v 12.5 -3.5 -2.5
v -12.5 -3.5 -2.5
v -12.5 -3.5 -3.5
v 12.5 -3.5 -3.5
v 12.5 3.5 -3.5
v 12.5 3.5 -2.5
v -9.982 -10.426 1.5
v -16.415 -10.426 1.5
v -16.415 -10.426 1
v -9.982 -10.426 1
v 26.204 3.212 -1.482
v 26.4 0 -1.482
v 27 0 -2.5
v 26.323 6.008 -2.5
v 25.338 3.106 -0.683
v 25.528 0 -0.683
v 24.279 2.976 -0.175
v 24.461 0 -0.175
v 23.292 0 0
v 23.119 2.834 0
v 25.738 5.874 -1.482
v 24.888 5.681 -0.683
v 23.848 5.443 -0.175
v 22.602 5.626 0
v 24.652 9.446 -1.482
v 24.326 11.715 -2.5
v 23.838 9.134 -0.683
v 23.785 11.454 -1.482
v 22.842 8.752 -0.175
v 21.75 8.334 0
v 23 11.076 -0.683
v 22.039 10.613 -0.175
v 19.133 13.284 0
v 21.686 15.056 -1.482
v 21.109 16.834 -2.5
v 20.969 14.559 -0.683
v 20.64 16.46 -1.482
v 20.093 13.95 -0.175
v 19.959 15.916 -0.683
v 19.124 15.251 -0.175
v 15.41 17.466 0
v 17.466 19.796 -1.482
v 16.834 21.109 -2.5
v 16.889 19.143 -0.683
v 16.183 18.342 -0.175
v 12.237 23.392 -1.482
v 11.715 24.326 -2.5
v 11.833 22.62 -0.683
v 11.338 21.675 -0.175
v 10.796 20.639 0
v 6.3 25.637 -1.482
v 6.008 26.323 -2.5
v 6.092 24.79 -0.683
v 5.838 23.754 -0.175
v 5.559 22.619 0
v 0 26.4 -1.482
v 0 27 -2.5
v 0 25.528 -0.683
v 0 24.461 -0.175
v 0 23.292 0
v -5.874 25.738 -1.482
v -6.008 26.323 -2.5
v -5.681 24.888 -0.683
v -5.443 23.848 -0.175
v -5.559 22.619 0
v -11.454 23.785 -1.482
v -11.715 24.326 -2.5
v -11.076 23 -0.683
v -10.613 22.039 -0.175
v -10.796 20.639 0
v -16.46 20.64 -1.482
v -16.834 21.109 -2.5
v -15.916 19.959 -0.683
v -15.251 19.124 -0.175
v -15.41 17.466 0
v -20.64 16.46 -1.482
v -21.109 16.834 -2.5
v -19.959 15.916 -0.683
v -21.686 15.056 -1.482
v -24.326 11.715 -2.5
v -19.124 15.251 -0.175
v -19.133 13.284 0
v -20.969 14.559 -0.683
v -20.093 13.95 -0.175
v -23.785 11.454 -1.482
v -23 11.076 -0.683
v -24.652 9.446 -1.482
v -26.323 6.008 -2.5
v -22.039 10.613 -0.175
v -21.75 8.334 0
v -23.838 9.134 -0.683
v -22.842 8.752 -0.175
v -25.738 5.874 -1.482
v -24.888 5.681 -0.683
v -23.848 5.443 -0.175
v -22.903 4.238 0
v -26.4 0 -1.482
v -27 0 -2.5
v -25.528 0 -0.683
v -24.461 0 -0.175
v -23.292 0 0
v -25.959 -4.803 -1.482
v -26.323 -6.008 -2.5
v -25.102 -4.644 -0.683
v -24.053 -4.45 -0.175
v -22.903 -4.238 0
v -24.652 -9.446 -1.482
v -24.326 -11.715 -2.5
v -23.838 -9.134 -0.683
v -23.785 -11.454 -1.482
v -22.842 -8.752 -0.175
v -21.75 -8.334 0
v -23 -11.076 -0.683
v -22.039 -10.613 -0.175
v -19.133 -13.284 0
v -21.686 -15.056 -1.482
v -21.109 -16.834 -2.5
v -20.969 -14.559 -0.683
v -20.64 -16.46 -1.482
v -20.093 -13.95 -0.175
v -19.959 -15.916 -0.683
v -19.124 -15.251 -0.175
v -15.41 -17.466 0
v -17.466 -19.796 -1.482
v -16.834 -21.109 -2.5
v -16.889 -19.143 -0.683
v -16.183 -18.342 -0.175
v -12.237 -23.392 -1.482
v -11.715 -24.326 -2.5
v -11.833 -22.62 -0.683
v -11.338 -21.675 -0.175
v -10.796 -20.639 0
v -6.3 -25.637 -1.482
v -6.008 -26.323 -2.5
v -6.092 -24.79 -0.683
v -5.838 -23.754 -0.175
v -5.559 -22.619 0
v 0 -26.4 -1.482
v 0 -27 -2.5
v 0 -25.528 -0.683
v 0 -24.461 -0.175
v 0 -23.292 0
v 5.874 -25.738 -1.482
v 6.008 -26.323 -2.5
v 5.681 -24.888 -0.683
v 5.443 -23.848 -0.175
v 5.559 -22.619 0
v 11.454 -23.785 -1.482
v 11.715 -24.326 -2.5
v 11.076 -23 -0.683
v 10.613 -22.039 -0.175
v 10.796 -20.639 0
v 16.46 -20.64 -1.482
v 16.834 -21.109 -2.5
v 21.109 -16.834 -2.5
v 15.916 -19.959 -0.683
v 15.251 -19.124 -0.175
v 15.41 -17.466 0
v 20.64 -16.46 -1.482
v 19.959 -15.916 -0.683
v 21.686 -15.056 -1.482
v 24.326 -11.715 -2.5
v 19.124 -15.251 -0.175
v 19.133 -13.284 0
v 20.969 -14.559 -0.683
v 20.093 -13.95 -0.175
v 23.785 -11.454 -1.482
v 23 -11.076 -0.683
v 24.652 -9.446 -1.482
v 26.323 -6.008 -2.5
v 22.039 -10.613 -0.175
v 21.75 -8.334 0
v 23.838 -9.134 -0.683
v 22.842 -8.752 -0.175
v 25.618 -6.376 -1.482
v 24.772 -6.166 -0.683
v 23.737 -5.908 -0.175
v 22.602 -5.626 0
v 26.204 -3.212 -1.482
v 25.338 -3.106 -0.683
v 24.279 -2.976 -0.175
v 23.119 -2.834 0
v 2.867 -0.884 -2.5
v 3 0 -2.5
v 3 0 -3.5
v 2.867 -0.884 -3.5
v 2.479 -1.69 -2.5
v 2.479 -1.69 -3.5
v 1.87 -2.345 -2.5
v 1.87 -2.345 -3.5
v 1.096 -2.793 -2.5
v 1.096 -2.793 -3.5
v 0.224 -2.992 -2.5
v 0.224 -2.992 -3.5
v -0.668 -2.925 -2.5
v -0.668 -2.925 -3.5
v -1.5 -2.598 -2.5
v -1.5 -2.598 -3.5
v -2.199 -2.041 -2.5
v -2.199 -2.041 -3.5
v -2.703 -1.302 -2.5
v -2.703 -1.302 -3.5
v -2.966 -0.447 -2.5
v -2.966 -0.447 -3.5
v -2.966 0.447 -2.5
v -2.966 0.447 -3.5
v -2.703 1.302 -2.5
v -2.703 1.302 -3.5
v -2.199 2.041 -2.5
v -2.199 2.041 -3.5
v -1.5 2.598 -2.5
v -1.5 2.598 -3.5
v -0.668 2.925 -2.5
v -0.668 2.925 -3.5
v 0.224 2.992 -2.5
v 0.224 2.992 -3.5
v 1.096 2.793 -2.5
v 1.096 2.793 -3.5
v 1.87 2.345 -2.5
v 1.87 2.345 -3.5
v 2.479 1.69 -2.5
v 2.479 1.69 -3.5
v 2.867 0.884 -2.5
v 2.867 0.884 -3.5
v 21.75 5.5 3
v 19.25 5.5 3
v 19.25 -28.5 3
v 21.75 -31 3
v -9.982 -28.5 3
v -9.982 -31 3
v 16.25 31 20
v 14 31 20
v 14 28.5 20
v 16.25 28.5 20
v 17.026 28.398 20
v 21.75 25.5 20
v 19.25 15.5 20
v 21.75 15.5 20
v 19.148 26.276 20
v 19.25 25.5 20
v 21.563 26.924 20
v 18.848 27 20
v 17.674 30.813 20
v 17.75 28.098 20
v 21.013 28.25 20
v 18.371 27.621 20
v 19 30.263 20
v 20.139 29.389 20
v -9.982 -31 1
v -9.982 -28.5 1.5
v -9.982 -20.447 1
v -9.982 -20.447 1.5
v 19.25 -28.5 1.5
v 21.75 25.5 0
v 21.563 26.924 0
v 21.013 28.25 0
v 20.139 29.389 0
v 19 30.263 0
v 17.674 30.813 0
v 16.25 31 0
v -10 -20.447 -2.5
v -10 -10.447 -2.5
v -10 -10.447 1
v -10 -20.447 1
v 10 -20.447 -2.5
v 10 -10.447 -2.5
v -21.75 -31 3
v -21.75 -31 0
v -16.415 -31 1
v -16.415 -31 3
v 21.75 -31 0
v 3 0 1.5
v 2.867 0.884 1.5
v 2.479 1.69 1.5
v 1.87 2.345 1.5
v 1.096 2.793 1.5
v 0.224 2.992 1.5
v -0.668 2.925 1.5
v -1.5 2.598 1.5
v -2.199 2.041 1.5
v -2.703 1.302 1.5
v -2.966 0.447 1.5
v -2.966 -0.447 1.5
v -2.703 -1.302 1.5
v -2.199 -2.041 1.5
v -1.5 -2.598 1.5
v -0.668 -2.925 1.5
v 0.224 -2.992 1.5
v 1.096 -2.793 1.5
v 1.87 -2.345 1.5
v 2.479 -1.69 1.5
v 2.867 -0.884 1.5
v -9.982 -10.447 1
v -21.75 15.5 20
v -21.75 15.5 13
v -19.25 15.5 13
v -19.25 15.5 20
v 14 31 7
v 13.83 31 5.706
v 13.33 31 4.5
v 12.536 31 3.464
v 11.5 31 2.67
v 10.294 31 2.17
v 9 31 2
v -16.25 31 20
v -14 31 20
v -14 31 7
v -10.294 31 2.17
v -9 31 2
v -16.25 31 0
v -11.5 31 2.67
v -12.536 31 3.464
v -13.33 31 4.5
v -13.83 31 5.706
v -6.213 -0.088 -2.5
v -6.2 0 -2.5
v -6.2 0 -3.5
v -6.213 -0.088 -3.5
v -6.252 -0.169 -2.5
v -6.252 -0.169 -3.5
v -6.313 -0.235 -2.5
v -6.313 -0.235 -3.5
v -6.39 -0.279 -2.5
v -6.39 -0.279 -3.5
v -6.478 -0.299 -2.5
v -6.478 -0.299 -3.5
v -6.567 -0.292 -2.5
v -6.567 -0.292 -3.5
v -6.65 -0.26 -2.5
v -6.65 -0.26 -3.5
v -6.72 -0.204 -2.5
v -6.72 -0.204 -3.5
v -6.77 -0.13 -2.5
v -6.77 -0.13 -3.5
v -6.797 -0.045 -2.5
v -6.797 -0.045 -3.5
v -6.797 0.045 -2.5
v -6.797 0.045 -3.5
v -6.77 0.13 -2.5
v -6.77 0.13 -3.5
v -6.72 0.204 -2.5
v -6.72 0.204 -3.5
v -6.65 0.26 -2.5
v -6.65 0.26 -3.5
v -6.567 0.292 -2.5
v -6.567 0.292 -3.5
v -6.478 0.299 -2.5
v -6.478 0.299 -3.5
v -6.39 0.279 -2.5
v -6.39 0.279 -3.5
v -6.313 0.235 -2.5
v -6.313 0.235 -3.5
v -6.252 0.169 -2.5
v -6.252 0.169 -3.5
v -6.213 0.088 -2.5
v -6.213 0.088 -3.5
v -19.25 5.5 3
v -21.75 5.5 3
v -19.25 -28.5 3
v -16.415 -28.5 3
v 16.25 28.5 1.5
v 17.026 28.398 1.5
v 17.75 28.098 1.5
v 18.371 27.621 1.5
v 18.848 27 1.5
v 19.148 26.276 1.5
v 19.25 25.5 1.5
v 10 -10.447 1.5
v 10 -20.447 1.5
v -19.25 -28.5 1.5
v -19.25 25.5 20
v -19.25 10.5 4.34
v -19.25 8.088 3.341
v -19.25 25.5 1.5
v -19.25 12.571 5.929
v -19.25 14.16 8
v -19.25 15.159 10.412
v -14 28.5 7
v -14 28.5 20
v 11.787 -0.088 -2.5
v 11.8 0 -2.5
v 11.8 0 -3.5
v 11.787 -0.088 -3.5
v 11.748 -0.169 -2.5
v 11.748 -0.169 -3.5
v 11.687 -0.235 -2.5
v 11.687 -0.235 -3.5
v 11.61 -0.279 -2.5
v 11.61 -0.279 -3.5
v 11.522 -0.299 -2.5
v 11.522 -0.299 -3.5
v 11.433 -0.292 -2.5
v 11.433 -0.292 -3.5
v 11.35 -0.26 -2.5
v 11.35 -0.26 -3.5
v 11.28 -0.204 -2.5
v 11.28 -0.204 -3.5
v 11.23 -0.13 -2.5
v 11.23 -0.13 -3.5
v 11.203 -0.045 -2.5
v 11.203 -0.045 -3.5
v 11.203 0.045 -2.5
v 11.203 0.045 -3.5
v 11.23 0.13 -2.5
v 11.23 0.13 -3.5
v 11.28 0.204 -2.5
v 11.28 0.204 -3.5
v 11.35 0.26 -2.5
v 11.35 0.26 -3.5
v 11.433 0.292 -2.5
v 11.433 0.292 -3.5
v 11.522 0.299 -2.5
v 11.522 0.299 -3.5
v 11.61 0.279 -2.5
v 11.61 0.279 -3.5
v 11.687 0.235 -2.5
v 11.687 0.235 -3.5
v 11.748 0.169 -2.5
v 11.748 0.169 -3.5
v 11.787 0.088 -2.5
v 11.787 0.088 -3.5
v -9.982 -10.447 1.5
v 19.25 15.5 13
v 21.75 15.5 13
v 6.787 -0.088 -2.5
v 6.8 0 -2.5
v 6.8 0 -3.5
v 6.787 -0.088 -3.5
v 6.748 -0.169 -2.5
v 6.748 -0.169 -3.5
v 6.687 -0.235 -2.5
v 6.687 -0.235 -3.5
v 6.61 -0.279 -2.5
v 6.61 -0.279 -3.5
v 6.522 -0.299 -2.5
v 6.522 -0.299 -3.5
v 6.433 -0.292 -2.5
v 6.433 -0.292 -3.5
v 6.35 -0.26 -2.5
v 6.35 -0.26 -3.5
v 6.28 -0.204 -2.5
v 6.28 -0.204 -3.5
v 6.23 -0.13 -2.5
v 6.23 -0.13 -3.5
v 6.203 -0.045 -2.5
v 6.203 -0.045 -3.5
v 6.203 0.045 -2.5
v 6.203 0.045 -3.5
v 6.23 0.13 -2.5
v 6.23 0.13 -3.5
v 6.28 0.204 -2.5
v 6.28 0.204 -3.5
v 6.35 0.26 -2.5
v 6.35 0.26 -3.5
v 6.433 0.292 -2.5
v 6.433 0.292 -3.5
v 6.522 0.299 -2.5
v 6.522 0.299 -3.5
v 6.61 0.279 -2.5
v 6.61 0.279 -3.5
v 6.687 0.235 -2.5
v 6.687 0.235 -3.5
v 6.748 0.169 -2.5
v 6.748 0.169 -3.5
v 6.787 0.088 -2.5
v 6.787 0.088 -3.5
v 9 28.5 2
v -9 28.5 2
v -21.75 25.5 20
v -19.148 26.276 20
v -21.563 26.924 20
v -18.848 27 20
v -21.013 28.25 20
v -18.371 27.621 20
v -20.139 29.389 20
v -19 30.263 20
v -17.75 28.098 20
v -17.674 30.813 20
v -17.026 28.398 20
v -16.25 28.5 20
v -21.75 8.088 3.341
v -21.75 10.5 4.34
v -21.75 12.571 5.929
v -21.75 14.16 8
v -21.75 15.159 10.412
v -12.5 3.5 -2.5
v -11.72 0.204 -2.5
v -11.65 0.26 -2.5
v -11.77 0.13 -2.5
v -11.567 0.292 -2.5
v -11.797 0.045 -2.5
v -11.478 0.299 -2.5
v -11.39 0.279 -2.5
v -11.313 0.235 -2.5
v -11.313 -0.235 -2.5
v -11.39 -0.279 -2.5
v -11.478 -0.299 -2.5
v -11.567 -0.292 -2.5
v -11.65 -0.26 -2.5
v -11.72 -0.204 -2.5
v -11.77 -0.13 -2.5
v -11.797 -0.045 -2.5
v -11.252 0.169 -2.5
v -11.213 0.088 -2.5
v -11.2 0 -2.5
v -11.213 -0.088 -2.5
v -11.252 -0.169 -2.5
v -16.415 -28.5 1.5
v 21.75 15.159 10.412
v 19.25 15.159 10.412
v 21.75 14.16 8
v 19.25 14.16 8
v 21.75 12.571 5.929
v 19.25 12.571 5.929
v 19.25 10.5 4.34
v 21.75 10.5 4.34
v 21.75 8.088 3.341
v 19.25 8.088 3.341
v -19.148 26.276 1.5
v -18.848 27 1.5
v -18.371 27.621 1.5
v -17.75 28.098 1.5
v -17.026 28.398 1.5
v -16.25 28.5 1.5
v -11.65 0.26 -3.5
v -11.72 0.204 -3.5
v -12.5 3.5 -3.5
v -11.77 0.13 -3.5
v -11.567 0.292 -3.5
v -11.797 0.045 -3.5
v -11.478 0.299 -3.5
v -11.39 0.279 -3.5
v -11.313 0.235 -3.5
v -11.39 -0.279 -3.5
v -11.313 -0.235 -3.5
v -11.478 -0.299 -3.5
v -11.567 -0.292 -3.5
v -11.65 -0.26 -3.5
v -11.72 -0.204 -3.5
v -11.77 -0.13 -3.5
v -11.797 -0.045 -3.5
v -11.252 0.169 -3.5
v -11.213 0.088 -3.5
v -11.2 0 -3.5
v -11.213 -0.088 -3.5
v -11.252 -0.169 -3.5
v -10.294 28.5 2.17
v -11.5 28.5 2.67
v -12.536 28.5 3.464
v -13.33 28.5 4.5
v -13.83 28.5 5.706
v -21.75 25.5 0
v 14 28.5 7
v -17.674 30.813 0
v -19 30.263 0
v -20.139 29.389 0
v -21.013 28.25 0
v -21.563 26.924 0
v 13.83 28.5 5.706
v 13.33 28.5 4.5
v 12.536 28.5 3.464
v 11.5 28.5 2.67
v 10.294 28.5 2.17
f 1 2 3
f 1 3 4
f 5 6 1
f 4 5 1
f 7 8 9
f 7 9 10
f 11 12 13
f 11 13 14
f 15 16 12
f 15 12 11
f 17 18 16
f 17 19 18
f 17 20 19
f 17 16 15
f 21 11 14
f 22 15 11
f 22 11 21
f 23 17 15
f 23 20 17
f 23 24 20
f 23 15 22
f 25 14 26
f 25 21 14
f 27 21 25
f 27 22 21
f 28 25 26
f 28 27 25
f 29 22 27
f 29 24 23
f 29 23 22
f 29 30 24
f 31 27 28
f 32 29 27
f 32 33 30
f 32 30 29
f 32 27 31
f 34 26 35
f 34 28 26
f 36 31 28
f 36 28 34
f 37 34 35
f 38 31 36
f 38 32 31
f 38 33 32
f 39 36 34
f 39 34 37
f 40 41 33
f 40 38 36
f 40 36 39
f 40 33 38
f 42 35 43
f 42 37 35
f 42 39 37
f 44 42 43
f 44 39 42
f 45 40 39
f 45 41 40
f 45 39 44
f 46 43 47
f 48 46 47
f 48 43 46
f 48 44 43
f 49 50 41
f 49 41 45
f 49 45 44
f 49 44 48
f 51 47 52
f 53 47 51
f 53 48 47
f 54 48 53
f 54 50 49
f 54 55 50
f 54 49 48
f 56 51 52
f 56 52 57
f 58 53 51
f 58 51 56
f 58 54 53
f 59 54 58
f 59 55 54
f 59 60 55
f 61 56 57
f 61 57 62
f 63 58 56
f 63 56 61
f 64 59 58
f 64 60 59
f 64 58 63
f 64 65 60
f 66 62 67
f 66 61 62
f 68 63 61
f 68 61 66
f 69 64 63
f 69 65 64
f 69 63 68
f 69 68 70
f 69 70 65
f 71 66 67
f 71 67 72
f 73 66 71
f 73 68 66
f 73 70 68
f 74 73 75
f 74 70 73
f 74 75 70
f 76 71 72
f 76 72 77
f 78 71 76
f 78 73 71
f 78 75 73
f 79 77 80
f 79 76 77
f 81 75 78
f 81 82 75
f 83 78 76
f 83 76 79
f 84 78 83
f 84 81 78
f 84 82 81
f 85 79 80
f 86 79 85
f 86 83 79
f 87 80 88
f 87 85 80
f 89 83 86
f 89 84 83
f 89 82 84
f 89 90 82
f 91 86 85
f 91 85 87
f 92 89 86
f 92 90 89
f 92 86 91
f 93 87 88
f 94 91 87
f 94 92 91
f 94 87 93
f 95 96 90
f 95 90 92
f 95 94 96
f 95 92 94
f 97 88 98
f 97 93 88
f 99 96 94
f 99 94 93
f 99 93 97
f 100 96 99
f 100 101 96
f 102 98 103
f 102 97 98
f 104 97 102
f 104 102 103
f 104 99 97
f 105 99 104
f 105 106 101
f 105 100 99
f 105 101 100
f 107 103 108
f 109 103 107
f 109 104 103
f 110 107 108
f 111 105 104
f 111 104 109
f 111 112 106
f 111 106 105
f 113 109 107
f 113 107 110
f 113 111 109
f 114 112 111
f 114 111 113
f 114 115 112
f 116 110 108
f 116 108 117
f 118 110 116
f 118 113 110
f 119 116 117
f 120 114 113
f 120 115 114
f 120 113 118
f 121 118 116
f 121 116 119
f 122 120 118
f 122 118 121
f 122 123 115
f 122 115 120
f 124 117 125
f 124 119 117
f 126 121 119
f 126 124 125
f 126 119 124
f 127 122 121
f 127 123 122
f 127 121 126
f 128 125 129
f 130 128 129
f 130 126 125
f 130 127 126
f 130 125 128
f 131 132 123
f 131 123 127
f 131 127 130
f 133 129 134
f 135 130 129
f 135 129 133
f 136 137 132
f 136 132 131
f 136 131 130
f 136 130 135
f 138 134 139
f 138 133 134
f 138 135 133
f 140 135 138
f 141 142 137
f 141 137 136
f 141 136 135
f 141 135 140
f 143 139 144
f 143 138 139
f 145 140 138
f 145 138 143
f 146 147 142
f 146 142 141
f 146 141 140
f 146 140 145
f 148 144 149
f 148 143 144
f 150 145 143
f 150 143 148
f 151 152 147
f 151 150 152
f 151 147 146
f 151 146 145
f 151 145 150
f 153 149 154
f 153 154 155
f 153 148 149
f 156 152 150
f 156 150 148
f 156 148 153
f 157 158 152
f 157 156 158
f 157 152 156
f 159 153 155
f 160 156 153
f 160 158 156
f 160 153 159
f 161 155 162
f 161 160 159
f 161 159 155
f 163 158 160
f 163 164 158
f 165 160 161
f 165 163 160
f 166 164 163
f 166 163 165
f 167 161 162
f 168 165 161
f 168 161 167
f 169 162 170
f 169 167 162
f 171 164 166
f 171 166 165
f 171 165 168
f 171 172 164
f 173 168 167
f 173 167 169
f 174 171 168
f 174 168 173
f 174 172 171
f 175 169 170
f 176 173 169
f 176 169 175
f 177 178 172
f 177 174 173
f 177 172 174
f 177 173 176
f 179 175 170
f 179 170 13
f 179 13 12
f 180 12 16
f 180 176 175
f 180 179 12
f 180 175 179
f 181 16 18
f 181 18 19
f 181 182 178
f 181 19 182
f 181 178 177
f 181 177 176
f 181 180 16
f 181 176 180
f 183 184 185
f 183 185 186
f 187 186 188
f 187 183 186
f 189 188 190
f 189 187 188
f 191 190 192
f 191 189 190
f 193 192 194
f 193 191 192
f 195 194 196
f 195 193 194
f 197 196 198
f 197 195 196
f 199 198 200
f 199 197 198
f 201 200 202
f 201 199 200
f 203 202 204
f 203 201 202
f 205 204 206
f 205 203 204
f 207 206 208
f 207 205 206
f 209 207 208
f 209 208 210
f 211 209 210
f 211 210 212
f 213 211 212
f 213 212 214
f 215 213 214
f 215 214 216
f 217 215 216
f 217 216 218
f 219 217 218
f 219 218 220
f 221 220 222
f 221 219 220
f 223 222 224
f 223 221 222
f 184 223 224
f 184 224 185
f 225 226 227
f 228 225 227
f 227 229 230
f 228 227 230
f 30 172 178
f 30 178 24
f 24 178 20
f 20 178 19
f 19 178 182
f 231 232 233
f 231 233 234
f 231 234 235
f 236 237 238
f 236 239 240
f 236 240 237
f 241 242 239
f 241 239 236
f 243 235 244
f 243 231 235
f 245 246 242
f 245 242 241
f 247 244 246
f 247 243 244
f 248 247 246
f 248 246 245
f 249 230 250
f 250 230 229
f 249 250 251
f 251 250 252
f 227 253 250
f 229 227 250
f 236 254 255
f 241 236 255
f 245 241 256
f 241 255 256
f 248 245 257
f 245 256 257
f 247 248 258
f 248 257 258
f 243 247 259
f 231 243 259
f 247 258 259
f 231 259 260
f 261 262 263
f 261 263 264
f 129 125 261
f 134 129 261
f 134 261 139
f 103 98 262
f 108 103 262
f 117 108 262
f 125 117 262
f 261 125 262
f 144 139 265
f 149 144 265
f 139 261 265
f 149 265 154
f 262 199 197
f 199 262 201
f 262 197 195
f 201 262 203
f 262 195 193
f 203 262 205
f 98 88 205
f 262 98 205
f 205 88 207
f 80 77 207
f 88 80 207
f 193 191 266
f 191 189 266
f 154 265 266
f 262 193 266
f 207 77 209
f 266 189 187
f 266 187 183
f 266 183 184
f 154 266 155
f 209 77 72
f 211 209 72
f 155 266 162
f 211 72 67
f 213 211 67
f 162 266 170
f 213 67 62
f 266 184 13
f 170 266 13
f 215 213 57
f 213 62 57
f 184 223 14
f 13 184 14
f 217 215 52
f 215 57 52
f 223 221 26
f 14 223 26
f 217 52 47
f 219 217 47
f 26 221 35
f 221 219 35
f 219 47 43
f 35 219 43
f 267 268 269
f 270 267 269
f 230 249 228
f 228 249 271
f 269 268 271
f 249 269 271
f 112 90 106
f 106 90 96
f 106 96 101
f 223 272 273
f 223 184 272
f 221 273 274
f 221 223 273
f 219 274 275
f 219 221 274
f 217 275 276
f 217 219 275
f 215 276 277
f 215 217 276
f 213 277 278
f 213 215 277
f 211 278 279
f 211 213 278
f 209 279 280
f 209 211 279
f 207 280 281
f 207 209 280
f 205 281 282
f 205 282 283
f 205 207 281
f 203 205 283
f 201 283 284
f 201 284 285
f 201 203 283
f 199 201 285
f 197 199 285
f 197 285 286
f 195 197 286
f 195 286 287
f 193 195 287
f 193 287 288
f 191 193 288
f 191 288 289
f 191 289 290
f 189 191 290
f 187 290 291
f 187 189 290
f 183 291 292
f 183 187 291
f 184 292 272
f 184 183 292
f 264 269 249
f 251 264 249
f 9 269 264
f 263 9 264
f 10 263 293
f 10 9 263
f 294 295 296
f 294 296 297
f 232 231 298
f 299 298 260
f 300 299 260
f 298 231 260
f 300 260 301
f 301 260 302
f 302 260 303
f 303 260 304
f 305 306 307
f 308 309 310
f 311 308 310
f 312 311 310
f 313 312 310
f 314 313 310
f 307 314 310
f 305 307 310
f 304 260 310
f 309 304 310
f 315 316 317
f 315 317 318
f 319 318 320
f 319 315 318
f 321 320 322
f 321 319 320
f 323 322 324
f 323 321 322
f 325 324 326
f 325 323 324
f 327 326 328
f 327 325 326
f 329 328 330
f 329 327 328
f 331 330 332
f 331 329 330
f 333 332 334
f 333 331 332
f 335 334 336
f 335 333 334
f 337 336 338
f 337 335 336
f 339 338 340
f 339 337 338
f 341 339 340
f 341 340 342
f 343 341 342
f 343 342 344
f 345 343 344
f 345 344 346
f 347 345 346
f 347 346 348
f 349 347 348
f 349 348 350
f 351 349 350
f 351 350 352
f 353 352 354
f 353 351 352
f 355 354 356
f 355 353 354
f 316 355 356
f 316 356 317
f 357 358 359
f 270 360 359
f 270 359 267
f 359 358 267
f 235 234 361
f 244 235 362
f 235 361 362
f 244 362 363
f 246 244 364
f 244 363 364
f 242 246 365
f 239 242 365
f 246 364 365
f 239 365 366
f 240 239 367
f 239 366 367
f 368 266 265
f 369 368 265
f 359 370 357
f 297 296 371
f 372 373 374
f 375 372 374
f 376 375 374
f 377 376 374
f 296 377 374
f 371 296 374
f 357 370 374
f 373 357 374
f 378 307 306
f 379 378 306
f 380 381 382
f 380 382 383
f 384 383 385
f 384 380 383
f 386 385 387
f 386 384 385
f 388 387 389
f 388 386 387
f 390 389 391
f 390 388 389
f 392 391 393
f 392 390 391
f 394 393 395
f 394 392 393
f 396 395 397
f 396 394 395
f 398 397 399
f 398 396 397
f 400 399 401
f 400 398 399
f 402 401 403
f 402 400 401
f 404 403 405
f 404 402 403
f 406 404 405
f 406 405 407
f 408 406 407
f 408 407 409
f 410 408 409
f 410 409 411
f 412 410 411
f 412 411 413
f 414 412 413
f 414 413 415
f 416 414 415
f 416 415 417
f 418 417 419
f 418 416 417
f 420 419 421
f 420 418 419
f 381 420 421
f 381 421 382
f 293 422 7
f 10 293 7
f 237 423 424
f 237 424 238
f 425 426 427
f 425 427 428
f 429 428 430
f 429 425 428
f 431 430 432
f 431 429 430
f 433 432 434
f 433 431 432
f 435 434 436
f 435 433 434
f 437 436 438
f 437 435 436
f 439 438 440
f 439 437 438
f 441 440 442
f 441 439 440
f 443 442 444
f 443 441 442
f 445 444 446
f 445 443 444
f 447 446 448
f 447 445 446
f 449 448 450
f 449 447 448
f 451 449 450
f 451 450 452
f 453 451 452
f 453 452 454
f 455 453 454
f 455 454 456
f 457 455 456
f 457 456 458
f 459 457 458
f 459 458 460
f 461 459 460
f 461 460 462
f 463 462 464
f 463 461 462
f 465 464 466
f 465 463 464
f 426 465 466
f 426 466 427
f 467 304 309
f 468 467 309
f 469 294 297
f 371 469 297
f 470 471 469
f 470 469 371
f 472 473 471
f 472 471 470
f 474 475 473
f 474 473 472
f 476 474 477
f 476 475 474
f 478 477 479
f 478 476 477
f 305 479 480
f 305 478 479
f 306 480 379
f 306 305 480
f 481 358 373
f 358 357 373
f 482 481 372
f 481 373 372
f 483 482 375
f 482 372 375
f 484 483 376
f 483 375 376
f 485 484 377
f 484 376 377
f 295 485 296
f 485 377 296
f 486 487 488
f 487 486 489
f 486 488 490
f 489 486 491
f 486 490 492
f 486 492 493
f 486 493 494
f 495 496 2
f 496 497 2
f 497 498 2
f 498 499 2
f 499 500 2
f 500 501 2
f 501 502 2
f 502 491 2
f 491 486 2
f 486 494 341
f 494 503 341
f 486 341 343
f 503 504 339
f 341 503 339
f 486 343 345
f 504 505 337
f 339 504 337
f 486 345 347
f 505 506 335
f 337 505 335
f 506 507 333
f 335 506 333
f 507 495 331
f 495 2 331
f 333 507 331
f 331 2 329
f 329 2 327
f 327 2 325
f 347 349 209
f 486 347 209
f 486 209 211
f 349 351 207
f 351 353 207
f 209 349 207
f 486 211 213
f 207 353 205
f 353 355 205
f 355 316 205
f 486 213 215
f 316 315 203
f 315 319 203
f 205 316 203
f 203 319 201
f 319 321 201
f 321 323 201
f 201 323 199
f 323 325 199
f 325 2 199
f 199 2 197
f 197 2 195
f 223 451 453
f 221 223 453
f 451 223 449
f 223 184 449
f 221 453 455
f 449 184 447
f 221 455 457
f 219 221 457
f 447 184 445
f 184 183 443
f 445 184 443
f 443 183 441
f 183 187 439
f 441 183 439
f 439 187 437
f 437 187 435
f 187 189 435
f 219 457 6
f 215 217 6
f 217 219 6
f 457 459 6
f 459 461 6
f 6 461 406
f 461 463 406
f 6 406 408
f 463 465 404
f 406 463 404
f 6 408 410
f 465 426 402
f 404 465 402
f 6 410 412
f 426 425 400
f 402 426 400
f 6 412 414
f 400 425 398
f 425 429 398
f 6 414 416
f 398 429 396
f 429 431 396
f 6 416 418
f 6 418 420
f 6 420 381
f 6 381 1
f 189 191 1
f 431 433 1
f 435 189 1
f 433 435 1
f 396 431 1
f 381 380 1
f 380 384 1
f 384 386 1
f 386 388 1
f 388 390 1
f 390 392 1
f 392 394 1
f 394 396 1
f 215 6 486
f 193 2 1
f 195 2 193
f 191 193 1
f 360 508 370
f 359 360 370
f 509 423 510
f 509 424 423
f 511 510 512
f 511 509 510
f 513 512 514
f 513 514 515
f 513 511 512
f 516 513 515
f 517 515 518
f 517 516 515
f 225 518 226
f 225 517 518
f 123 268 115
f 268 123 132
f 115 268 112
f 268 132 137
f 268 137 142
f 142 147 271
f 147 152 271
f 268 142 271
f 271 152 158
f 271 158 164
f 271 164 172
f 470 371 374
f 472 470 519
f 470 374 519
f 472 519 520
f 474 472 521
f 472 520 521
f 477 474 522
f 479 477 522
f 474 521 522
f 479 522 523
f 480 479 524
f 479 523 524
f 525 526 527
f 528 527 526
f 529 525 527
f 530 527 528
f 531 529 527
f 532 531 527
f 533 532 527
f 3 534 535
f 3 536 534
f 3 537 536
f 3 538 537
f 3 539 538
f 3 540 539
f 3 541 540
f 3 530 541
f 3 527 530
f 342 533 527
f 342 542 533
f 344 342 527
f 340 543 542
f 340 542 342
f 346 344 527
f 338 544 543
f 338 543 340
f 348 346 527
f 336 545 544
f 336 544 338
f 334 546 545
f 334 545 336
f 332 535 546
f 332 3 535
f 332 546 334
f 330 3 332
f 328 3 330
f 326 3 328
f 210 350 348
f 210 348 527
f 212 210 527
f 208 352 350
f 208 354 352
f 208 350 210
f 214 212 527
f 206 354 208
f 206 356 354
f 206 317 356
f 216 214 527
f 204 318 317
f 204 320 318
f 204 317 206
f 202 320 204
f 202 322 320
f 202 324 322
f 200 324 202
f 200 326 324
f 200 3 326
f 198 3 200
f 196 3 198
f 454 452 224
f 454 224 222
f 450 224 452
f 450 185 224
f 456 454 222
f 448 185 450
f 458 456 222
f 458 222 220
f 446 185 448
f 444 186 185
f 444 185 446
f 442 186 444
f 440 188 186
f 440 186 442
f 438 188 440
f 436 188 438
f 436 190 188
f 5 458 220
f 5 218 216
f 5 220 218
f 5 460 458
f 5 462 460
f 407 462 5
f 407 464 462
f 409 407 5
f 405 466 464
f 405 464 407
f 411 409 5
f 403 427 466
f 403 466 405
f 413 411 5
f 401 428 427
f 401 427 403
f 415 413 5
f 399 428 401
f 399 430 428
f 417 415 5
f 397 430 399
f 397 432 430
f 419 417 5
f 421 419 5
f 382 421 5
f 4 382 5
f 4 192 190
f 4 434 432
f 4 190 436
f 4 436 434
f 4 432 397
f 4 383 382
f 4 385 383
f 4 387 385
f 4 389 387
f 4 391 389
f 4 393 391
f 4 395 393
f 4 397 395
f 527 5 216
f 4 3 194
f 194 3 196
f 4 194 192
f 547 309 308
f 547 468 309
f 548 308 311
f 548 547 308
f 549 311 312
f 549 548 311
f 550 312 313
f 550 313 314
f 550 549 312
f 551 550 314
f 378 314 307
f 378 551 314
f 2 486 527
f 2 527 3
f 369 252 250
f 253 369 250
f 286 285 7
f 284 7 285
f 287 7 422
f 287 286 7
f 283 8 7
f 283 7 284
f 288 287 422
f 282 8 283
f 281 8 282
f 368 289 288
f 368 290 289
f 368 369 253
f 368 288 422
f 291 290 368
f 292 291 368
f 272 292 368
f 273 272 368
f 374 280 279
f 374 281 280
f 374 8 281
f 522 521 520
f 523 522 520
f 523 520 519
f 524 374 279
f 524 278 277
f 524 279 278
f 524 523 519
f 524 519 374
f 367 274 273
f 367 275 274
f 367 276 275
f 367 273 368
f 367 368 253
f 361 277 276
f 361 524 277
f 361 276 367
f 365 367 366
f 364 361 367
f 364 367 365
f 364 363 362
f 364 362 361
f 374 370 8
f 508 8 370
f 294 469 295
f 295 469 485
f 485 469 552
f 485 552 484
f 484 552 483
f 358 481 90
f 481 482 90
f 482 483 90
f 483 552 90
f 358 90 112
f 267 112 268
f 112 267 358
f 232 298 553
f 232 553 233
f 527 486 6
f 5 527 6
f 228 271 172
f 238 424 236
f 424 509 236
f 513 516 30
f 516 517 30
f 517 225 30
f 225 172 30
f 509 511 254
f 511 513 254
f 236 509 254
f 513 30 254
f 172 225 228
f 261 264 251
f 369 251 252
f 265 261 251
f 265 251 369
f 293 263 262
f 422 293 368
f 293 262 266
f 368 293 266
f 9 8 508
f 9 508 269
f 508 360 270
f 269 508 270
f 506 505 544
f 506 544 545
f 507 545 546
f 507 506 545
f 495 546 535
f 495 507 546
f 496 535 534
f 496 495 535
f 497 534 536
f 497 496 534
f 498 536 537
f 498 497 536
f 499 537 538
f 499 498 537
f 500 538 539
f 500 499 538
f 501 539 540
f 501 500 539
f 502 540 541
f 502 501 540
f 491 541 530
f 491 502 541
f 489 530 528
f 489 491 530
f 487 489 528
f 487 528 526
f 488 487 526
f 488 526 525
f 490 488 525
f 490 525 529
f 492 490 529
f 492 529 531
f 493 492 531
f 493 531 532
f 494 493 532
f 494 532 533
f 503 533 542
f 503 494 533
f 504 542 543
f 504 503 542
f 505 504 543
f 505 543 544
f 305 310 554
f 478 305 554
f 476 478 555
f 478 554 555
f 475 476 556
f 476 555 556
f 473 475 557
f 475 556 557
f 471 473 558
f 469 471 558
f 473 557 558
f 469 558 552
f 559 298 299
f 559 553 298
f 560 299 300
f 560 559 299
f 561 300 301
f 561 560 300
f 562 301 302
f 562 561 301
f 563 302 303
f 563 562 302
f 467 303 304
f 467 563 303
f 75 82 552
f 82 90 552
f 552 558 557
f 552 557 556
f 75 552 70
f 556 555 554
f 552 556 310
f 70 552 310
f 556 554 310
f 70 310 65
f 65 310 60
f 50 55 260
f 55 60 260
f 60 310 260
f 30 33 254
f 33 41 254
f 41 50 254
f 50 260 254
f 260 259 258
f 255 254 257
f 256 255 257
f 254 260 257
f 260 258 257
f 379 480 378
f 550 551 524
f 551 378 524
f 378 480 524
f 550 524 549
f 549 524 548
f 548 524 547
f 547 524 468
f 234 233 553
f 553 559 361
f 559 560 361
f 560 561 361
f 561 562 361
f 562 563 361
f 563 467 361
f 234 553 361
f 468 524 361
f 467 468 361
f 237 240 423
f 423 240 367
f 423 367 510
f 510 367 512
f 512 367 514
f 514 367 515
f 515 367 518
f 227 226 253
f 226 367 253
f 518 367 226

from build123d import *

# Parameters (mm, degrees)
F0_R      = 27
F0_R_2    = 3
F1_DEPTH  = 2.5
F2_W      = 25
F2_H      = 7
F2_R      = 0.3
F2_R_2    = 3
F3_DEPTH  = 1
F5_R      = 3
F6_DEPTH  = 1.5
F7_DEPTH  = 20
F8_W      = 36.5
F8_H      = 17
F8_W_2    = 10
F9_DEPTH  = 48.751
F10_W     = 28
F10_H     = 18
F11_DEPTH = 2.5
F12_R     = 10
F13_R     = 5
F14_W     = 20
F14_H     = 10
F15_DEPTH = 25
F16_W     = 6.433098577
F16_H     = 18.0739424974
F16_H_2   = 2.5
F17_DEPTH = 2


# Not quite as in the source:
# - a fillet or chamfer that OpenCascade refuses, or shapes differently, is made with other operations: its cross-section is extruded or revolved along the edge and cut away or added


with BuildPart() as f1:
    # F0 (on Top) → F1 (new body)
    with BuildSketch(Plane.XY):
        Circle(F0_R)
        Circle(F0_R_2, mode=Mode.SUBTRACT)
    extrude(amount=-F1_DEPTH)

    # F4: fillet of radius 4 on 1 edges, made by hand

    # F4_s1 → F4_t2 (revolve, cut)
    with BuildSketch(Plane.XZ):
        with BuildLine():
            ThreePointArc((27, -2.5), (25.527968734, -0.6833752096), (23.2919007565, 0))
            Line((23.2919007565, 0), (27, 0))
            Line((27, 0), (27, -2.5))
        make_face()
    revolve(axis=Axis((0, 0, 0), (0, 0, 1)), mode=Mode.SUBTRACT)

    # F5 (on face) → F6 (join)
    with BuildSketch(Plane.XY):
        with BuildLine():
            Line((-19.25, -28.5), (19.25, -28.5))
            Line((19.25, -28.5), (19.25, -13.1129760486))
            ThreePointArc((19.25, -13.1129760486), (0, -23.2919007565), (-19.25, -13.1129760486))
            Line((-19.25, -13.1129760486), (-19.25, -28.5))
        make_face()
        with BuildLine():
            ThreePointArc((-19.25, -13.1129760486), (0, -23.2919007565), (19.25, -13.1129760486))
            Line((19.25, -13.1129760486), (19.25, 13.1129760486))
            ThreePointArc((19.25, 13.1129760486), (0, 23.2919007565), (-19.25, 13.1129760486))
            Line((-19.25, 13.1129760486), (-19.25, -13.1129760486))
        make_face()
        Circle(F5_R, mode=Mode.SUBTRACT)
        with BuildLine():
            ThreePointArc((-19.25, 13.1129760486), (0, 23.2919007565), (19.25, 13.1129760486))
            Line((19.25, 13.1129760486), (19.25, 25.5))
            ThreePointArc((19.25, 25.5), (18.3713203436, 27.6213203436), (16.25, 28.5))
            Line((16.25, 28.5), (-16.25, 28.5))
            ThreePointArc((-16.25, 28.5), (-18.3713203436, 27.6213203436), (-19.25, 25.5))
            Line((-19.25, 25.5), (-19.25, 13.1129760486))
        make_face()
    extrude(amount=F6_DEPTH)

    # F5 (on face) → F7 (join)
    with BuildSketch(Plane.XY):
        with BuildLine():
            ThreePointArc((21.75, 25.5), (20.1390872965, 29.3890872965), (16.25, 31))
            Line((16.25, 31), (-16.25, 31))
            ThreePointArc((-16.25, 31), (-20.1390872965, 29.3890872965), (-21.75, 25.5))
            Line((-21.75, 25.5), (-21.75, -31))
            Line((-21.75, -31), (21.75, -31))
            Line((21.75, -31), (21.75, 25.5))
        make_face()
        with BuildLine():
            Line((19.25, 25.5), (19.25, -28.5))
            Line((19.25, -28.5), (-19.25, -28.5))
            Line((-19.25, -28.5), (-19.25, 25.5))
            ThreePointArc((-19.25, 25.5), (-18.3713203436, 27.6213203436), (-16.25, 28.5))
            Line((-16.25, 28.5), (16.25, 28.5))
            ThreePointArc((16.25, 28.5), (18.3713203436, 27.6213203436), (19.25, 25.5))
        make_face(mode=Mode.SUBTRACT)
    extrude(amount=F7_DEPTH)

    # F8 (on face) → F9 (cut, through all)
    with BuildSketch(Plane(origin=(-21.75, 0, 0), x_dir=(0, -1, 0), z_dir=(-1, 0, 0))):
        with Locations((2.75, 11.5)):
            Rectangle(F8_W, F8_H)
        with Locations((26, 11.5)):
            Rectangle(F8_W_2, F8_H)
    extrude(amount=-F9_DEPTH, mode=Mode.SUBTRACT)

    # F10 (on face) → F11 (cut)
    with BuildSketch(Plane(origin=(0, 31, 0), x_dir=(-1, 0, 0), z_dir=(0, 1, 0))):
        with Locations((0, 11)):
            Rectangle(F10_W, F10_H)
    extrude(amount=-F11_DEPTH, mode=Mode.SUBTRACT)

    # F12
    f12_edges = [f1.edges().sort_by_distance(p)[0] for p in [
        (-20.5, 15.5, 3),
        (20.5, 15.5, 3),
    ]]
    fillet(f12_edges, radius=F12_R)

    # F13
    f13_edges = [f1.edges().sort_by_distance(p)[0] for p in [
        (14, 29.75, 2),
        (-14, 29.75, 2),
    ]]
    fillet(f13_edges, radius=F13_R)

    # F14 (on face) → F15 (cut)
    with BuildSketch(Plane(origin=(0, 0, -2.5), x_dir=(1, 0, 0), z_dir=(0, 0, -1))):
        with Locations((0, 15.4472477734)):
            Rectangle(F14_W, F14_H)
    extrude(amount=-F15_DEPTH, mode=Mode.SUBTRACT)

    # F16 (on face) → F17 (cut)
    with BuildSketch(Plane.XY.offset(3)):
        with Locations((-13.1989442743, -19.4630287513)):
            Rectangle(F16_W, F16_H)
        with Locations((-13.1989442743, -29.75)):
            Rectangle(F16_W, F16_H_2)
    extrude(amount=-F17_DEPTH, mode=Mode.SUBTRACT)


with BuildPart() as f3:
    # F2 (on face) → F3 (new body)
    with BuildSketch(Plane(origin=(0, 0, -2.5), x_dir=(1, 0, 0), z_dir=(0, 0, -1))):
        Rectangle(F2_W, F2_H)
        with Locations((-11.5, 0)):
            Circle(F2_R, mode=Mode.SUBTRACT)
        with Locations((-6.5, 0)):
            Circle(F2_R, mode=Mode.SUBTRACT)
        Circle(F2_R_2, mode=Mode.SUBTRACT)
        with Locations((6.5, 0)):
            Circle(F2_R, mode=Mode.SUBTRACT)
        with Locations((11.5, 0)):
            Circle(F2_R, mode=Mode.SUBTRACT)
    extrude(amount=F3_DEPTH)


solid = Compound([f1.part, f3.part])
